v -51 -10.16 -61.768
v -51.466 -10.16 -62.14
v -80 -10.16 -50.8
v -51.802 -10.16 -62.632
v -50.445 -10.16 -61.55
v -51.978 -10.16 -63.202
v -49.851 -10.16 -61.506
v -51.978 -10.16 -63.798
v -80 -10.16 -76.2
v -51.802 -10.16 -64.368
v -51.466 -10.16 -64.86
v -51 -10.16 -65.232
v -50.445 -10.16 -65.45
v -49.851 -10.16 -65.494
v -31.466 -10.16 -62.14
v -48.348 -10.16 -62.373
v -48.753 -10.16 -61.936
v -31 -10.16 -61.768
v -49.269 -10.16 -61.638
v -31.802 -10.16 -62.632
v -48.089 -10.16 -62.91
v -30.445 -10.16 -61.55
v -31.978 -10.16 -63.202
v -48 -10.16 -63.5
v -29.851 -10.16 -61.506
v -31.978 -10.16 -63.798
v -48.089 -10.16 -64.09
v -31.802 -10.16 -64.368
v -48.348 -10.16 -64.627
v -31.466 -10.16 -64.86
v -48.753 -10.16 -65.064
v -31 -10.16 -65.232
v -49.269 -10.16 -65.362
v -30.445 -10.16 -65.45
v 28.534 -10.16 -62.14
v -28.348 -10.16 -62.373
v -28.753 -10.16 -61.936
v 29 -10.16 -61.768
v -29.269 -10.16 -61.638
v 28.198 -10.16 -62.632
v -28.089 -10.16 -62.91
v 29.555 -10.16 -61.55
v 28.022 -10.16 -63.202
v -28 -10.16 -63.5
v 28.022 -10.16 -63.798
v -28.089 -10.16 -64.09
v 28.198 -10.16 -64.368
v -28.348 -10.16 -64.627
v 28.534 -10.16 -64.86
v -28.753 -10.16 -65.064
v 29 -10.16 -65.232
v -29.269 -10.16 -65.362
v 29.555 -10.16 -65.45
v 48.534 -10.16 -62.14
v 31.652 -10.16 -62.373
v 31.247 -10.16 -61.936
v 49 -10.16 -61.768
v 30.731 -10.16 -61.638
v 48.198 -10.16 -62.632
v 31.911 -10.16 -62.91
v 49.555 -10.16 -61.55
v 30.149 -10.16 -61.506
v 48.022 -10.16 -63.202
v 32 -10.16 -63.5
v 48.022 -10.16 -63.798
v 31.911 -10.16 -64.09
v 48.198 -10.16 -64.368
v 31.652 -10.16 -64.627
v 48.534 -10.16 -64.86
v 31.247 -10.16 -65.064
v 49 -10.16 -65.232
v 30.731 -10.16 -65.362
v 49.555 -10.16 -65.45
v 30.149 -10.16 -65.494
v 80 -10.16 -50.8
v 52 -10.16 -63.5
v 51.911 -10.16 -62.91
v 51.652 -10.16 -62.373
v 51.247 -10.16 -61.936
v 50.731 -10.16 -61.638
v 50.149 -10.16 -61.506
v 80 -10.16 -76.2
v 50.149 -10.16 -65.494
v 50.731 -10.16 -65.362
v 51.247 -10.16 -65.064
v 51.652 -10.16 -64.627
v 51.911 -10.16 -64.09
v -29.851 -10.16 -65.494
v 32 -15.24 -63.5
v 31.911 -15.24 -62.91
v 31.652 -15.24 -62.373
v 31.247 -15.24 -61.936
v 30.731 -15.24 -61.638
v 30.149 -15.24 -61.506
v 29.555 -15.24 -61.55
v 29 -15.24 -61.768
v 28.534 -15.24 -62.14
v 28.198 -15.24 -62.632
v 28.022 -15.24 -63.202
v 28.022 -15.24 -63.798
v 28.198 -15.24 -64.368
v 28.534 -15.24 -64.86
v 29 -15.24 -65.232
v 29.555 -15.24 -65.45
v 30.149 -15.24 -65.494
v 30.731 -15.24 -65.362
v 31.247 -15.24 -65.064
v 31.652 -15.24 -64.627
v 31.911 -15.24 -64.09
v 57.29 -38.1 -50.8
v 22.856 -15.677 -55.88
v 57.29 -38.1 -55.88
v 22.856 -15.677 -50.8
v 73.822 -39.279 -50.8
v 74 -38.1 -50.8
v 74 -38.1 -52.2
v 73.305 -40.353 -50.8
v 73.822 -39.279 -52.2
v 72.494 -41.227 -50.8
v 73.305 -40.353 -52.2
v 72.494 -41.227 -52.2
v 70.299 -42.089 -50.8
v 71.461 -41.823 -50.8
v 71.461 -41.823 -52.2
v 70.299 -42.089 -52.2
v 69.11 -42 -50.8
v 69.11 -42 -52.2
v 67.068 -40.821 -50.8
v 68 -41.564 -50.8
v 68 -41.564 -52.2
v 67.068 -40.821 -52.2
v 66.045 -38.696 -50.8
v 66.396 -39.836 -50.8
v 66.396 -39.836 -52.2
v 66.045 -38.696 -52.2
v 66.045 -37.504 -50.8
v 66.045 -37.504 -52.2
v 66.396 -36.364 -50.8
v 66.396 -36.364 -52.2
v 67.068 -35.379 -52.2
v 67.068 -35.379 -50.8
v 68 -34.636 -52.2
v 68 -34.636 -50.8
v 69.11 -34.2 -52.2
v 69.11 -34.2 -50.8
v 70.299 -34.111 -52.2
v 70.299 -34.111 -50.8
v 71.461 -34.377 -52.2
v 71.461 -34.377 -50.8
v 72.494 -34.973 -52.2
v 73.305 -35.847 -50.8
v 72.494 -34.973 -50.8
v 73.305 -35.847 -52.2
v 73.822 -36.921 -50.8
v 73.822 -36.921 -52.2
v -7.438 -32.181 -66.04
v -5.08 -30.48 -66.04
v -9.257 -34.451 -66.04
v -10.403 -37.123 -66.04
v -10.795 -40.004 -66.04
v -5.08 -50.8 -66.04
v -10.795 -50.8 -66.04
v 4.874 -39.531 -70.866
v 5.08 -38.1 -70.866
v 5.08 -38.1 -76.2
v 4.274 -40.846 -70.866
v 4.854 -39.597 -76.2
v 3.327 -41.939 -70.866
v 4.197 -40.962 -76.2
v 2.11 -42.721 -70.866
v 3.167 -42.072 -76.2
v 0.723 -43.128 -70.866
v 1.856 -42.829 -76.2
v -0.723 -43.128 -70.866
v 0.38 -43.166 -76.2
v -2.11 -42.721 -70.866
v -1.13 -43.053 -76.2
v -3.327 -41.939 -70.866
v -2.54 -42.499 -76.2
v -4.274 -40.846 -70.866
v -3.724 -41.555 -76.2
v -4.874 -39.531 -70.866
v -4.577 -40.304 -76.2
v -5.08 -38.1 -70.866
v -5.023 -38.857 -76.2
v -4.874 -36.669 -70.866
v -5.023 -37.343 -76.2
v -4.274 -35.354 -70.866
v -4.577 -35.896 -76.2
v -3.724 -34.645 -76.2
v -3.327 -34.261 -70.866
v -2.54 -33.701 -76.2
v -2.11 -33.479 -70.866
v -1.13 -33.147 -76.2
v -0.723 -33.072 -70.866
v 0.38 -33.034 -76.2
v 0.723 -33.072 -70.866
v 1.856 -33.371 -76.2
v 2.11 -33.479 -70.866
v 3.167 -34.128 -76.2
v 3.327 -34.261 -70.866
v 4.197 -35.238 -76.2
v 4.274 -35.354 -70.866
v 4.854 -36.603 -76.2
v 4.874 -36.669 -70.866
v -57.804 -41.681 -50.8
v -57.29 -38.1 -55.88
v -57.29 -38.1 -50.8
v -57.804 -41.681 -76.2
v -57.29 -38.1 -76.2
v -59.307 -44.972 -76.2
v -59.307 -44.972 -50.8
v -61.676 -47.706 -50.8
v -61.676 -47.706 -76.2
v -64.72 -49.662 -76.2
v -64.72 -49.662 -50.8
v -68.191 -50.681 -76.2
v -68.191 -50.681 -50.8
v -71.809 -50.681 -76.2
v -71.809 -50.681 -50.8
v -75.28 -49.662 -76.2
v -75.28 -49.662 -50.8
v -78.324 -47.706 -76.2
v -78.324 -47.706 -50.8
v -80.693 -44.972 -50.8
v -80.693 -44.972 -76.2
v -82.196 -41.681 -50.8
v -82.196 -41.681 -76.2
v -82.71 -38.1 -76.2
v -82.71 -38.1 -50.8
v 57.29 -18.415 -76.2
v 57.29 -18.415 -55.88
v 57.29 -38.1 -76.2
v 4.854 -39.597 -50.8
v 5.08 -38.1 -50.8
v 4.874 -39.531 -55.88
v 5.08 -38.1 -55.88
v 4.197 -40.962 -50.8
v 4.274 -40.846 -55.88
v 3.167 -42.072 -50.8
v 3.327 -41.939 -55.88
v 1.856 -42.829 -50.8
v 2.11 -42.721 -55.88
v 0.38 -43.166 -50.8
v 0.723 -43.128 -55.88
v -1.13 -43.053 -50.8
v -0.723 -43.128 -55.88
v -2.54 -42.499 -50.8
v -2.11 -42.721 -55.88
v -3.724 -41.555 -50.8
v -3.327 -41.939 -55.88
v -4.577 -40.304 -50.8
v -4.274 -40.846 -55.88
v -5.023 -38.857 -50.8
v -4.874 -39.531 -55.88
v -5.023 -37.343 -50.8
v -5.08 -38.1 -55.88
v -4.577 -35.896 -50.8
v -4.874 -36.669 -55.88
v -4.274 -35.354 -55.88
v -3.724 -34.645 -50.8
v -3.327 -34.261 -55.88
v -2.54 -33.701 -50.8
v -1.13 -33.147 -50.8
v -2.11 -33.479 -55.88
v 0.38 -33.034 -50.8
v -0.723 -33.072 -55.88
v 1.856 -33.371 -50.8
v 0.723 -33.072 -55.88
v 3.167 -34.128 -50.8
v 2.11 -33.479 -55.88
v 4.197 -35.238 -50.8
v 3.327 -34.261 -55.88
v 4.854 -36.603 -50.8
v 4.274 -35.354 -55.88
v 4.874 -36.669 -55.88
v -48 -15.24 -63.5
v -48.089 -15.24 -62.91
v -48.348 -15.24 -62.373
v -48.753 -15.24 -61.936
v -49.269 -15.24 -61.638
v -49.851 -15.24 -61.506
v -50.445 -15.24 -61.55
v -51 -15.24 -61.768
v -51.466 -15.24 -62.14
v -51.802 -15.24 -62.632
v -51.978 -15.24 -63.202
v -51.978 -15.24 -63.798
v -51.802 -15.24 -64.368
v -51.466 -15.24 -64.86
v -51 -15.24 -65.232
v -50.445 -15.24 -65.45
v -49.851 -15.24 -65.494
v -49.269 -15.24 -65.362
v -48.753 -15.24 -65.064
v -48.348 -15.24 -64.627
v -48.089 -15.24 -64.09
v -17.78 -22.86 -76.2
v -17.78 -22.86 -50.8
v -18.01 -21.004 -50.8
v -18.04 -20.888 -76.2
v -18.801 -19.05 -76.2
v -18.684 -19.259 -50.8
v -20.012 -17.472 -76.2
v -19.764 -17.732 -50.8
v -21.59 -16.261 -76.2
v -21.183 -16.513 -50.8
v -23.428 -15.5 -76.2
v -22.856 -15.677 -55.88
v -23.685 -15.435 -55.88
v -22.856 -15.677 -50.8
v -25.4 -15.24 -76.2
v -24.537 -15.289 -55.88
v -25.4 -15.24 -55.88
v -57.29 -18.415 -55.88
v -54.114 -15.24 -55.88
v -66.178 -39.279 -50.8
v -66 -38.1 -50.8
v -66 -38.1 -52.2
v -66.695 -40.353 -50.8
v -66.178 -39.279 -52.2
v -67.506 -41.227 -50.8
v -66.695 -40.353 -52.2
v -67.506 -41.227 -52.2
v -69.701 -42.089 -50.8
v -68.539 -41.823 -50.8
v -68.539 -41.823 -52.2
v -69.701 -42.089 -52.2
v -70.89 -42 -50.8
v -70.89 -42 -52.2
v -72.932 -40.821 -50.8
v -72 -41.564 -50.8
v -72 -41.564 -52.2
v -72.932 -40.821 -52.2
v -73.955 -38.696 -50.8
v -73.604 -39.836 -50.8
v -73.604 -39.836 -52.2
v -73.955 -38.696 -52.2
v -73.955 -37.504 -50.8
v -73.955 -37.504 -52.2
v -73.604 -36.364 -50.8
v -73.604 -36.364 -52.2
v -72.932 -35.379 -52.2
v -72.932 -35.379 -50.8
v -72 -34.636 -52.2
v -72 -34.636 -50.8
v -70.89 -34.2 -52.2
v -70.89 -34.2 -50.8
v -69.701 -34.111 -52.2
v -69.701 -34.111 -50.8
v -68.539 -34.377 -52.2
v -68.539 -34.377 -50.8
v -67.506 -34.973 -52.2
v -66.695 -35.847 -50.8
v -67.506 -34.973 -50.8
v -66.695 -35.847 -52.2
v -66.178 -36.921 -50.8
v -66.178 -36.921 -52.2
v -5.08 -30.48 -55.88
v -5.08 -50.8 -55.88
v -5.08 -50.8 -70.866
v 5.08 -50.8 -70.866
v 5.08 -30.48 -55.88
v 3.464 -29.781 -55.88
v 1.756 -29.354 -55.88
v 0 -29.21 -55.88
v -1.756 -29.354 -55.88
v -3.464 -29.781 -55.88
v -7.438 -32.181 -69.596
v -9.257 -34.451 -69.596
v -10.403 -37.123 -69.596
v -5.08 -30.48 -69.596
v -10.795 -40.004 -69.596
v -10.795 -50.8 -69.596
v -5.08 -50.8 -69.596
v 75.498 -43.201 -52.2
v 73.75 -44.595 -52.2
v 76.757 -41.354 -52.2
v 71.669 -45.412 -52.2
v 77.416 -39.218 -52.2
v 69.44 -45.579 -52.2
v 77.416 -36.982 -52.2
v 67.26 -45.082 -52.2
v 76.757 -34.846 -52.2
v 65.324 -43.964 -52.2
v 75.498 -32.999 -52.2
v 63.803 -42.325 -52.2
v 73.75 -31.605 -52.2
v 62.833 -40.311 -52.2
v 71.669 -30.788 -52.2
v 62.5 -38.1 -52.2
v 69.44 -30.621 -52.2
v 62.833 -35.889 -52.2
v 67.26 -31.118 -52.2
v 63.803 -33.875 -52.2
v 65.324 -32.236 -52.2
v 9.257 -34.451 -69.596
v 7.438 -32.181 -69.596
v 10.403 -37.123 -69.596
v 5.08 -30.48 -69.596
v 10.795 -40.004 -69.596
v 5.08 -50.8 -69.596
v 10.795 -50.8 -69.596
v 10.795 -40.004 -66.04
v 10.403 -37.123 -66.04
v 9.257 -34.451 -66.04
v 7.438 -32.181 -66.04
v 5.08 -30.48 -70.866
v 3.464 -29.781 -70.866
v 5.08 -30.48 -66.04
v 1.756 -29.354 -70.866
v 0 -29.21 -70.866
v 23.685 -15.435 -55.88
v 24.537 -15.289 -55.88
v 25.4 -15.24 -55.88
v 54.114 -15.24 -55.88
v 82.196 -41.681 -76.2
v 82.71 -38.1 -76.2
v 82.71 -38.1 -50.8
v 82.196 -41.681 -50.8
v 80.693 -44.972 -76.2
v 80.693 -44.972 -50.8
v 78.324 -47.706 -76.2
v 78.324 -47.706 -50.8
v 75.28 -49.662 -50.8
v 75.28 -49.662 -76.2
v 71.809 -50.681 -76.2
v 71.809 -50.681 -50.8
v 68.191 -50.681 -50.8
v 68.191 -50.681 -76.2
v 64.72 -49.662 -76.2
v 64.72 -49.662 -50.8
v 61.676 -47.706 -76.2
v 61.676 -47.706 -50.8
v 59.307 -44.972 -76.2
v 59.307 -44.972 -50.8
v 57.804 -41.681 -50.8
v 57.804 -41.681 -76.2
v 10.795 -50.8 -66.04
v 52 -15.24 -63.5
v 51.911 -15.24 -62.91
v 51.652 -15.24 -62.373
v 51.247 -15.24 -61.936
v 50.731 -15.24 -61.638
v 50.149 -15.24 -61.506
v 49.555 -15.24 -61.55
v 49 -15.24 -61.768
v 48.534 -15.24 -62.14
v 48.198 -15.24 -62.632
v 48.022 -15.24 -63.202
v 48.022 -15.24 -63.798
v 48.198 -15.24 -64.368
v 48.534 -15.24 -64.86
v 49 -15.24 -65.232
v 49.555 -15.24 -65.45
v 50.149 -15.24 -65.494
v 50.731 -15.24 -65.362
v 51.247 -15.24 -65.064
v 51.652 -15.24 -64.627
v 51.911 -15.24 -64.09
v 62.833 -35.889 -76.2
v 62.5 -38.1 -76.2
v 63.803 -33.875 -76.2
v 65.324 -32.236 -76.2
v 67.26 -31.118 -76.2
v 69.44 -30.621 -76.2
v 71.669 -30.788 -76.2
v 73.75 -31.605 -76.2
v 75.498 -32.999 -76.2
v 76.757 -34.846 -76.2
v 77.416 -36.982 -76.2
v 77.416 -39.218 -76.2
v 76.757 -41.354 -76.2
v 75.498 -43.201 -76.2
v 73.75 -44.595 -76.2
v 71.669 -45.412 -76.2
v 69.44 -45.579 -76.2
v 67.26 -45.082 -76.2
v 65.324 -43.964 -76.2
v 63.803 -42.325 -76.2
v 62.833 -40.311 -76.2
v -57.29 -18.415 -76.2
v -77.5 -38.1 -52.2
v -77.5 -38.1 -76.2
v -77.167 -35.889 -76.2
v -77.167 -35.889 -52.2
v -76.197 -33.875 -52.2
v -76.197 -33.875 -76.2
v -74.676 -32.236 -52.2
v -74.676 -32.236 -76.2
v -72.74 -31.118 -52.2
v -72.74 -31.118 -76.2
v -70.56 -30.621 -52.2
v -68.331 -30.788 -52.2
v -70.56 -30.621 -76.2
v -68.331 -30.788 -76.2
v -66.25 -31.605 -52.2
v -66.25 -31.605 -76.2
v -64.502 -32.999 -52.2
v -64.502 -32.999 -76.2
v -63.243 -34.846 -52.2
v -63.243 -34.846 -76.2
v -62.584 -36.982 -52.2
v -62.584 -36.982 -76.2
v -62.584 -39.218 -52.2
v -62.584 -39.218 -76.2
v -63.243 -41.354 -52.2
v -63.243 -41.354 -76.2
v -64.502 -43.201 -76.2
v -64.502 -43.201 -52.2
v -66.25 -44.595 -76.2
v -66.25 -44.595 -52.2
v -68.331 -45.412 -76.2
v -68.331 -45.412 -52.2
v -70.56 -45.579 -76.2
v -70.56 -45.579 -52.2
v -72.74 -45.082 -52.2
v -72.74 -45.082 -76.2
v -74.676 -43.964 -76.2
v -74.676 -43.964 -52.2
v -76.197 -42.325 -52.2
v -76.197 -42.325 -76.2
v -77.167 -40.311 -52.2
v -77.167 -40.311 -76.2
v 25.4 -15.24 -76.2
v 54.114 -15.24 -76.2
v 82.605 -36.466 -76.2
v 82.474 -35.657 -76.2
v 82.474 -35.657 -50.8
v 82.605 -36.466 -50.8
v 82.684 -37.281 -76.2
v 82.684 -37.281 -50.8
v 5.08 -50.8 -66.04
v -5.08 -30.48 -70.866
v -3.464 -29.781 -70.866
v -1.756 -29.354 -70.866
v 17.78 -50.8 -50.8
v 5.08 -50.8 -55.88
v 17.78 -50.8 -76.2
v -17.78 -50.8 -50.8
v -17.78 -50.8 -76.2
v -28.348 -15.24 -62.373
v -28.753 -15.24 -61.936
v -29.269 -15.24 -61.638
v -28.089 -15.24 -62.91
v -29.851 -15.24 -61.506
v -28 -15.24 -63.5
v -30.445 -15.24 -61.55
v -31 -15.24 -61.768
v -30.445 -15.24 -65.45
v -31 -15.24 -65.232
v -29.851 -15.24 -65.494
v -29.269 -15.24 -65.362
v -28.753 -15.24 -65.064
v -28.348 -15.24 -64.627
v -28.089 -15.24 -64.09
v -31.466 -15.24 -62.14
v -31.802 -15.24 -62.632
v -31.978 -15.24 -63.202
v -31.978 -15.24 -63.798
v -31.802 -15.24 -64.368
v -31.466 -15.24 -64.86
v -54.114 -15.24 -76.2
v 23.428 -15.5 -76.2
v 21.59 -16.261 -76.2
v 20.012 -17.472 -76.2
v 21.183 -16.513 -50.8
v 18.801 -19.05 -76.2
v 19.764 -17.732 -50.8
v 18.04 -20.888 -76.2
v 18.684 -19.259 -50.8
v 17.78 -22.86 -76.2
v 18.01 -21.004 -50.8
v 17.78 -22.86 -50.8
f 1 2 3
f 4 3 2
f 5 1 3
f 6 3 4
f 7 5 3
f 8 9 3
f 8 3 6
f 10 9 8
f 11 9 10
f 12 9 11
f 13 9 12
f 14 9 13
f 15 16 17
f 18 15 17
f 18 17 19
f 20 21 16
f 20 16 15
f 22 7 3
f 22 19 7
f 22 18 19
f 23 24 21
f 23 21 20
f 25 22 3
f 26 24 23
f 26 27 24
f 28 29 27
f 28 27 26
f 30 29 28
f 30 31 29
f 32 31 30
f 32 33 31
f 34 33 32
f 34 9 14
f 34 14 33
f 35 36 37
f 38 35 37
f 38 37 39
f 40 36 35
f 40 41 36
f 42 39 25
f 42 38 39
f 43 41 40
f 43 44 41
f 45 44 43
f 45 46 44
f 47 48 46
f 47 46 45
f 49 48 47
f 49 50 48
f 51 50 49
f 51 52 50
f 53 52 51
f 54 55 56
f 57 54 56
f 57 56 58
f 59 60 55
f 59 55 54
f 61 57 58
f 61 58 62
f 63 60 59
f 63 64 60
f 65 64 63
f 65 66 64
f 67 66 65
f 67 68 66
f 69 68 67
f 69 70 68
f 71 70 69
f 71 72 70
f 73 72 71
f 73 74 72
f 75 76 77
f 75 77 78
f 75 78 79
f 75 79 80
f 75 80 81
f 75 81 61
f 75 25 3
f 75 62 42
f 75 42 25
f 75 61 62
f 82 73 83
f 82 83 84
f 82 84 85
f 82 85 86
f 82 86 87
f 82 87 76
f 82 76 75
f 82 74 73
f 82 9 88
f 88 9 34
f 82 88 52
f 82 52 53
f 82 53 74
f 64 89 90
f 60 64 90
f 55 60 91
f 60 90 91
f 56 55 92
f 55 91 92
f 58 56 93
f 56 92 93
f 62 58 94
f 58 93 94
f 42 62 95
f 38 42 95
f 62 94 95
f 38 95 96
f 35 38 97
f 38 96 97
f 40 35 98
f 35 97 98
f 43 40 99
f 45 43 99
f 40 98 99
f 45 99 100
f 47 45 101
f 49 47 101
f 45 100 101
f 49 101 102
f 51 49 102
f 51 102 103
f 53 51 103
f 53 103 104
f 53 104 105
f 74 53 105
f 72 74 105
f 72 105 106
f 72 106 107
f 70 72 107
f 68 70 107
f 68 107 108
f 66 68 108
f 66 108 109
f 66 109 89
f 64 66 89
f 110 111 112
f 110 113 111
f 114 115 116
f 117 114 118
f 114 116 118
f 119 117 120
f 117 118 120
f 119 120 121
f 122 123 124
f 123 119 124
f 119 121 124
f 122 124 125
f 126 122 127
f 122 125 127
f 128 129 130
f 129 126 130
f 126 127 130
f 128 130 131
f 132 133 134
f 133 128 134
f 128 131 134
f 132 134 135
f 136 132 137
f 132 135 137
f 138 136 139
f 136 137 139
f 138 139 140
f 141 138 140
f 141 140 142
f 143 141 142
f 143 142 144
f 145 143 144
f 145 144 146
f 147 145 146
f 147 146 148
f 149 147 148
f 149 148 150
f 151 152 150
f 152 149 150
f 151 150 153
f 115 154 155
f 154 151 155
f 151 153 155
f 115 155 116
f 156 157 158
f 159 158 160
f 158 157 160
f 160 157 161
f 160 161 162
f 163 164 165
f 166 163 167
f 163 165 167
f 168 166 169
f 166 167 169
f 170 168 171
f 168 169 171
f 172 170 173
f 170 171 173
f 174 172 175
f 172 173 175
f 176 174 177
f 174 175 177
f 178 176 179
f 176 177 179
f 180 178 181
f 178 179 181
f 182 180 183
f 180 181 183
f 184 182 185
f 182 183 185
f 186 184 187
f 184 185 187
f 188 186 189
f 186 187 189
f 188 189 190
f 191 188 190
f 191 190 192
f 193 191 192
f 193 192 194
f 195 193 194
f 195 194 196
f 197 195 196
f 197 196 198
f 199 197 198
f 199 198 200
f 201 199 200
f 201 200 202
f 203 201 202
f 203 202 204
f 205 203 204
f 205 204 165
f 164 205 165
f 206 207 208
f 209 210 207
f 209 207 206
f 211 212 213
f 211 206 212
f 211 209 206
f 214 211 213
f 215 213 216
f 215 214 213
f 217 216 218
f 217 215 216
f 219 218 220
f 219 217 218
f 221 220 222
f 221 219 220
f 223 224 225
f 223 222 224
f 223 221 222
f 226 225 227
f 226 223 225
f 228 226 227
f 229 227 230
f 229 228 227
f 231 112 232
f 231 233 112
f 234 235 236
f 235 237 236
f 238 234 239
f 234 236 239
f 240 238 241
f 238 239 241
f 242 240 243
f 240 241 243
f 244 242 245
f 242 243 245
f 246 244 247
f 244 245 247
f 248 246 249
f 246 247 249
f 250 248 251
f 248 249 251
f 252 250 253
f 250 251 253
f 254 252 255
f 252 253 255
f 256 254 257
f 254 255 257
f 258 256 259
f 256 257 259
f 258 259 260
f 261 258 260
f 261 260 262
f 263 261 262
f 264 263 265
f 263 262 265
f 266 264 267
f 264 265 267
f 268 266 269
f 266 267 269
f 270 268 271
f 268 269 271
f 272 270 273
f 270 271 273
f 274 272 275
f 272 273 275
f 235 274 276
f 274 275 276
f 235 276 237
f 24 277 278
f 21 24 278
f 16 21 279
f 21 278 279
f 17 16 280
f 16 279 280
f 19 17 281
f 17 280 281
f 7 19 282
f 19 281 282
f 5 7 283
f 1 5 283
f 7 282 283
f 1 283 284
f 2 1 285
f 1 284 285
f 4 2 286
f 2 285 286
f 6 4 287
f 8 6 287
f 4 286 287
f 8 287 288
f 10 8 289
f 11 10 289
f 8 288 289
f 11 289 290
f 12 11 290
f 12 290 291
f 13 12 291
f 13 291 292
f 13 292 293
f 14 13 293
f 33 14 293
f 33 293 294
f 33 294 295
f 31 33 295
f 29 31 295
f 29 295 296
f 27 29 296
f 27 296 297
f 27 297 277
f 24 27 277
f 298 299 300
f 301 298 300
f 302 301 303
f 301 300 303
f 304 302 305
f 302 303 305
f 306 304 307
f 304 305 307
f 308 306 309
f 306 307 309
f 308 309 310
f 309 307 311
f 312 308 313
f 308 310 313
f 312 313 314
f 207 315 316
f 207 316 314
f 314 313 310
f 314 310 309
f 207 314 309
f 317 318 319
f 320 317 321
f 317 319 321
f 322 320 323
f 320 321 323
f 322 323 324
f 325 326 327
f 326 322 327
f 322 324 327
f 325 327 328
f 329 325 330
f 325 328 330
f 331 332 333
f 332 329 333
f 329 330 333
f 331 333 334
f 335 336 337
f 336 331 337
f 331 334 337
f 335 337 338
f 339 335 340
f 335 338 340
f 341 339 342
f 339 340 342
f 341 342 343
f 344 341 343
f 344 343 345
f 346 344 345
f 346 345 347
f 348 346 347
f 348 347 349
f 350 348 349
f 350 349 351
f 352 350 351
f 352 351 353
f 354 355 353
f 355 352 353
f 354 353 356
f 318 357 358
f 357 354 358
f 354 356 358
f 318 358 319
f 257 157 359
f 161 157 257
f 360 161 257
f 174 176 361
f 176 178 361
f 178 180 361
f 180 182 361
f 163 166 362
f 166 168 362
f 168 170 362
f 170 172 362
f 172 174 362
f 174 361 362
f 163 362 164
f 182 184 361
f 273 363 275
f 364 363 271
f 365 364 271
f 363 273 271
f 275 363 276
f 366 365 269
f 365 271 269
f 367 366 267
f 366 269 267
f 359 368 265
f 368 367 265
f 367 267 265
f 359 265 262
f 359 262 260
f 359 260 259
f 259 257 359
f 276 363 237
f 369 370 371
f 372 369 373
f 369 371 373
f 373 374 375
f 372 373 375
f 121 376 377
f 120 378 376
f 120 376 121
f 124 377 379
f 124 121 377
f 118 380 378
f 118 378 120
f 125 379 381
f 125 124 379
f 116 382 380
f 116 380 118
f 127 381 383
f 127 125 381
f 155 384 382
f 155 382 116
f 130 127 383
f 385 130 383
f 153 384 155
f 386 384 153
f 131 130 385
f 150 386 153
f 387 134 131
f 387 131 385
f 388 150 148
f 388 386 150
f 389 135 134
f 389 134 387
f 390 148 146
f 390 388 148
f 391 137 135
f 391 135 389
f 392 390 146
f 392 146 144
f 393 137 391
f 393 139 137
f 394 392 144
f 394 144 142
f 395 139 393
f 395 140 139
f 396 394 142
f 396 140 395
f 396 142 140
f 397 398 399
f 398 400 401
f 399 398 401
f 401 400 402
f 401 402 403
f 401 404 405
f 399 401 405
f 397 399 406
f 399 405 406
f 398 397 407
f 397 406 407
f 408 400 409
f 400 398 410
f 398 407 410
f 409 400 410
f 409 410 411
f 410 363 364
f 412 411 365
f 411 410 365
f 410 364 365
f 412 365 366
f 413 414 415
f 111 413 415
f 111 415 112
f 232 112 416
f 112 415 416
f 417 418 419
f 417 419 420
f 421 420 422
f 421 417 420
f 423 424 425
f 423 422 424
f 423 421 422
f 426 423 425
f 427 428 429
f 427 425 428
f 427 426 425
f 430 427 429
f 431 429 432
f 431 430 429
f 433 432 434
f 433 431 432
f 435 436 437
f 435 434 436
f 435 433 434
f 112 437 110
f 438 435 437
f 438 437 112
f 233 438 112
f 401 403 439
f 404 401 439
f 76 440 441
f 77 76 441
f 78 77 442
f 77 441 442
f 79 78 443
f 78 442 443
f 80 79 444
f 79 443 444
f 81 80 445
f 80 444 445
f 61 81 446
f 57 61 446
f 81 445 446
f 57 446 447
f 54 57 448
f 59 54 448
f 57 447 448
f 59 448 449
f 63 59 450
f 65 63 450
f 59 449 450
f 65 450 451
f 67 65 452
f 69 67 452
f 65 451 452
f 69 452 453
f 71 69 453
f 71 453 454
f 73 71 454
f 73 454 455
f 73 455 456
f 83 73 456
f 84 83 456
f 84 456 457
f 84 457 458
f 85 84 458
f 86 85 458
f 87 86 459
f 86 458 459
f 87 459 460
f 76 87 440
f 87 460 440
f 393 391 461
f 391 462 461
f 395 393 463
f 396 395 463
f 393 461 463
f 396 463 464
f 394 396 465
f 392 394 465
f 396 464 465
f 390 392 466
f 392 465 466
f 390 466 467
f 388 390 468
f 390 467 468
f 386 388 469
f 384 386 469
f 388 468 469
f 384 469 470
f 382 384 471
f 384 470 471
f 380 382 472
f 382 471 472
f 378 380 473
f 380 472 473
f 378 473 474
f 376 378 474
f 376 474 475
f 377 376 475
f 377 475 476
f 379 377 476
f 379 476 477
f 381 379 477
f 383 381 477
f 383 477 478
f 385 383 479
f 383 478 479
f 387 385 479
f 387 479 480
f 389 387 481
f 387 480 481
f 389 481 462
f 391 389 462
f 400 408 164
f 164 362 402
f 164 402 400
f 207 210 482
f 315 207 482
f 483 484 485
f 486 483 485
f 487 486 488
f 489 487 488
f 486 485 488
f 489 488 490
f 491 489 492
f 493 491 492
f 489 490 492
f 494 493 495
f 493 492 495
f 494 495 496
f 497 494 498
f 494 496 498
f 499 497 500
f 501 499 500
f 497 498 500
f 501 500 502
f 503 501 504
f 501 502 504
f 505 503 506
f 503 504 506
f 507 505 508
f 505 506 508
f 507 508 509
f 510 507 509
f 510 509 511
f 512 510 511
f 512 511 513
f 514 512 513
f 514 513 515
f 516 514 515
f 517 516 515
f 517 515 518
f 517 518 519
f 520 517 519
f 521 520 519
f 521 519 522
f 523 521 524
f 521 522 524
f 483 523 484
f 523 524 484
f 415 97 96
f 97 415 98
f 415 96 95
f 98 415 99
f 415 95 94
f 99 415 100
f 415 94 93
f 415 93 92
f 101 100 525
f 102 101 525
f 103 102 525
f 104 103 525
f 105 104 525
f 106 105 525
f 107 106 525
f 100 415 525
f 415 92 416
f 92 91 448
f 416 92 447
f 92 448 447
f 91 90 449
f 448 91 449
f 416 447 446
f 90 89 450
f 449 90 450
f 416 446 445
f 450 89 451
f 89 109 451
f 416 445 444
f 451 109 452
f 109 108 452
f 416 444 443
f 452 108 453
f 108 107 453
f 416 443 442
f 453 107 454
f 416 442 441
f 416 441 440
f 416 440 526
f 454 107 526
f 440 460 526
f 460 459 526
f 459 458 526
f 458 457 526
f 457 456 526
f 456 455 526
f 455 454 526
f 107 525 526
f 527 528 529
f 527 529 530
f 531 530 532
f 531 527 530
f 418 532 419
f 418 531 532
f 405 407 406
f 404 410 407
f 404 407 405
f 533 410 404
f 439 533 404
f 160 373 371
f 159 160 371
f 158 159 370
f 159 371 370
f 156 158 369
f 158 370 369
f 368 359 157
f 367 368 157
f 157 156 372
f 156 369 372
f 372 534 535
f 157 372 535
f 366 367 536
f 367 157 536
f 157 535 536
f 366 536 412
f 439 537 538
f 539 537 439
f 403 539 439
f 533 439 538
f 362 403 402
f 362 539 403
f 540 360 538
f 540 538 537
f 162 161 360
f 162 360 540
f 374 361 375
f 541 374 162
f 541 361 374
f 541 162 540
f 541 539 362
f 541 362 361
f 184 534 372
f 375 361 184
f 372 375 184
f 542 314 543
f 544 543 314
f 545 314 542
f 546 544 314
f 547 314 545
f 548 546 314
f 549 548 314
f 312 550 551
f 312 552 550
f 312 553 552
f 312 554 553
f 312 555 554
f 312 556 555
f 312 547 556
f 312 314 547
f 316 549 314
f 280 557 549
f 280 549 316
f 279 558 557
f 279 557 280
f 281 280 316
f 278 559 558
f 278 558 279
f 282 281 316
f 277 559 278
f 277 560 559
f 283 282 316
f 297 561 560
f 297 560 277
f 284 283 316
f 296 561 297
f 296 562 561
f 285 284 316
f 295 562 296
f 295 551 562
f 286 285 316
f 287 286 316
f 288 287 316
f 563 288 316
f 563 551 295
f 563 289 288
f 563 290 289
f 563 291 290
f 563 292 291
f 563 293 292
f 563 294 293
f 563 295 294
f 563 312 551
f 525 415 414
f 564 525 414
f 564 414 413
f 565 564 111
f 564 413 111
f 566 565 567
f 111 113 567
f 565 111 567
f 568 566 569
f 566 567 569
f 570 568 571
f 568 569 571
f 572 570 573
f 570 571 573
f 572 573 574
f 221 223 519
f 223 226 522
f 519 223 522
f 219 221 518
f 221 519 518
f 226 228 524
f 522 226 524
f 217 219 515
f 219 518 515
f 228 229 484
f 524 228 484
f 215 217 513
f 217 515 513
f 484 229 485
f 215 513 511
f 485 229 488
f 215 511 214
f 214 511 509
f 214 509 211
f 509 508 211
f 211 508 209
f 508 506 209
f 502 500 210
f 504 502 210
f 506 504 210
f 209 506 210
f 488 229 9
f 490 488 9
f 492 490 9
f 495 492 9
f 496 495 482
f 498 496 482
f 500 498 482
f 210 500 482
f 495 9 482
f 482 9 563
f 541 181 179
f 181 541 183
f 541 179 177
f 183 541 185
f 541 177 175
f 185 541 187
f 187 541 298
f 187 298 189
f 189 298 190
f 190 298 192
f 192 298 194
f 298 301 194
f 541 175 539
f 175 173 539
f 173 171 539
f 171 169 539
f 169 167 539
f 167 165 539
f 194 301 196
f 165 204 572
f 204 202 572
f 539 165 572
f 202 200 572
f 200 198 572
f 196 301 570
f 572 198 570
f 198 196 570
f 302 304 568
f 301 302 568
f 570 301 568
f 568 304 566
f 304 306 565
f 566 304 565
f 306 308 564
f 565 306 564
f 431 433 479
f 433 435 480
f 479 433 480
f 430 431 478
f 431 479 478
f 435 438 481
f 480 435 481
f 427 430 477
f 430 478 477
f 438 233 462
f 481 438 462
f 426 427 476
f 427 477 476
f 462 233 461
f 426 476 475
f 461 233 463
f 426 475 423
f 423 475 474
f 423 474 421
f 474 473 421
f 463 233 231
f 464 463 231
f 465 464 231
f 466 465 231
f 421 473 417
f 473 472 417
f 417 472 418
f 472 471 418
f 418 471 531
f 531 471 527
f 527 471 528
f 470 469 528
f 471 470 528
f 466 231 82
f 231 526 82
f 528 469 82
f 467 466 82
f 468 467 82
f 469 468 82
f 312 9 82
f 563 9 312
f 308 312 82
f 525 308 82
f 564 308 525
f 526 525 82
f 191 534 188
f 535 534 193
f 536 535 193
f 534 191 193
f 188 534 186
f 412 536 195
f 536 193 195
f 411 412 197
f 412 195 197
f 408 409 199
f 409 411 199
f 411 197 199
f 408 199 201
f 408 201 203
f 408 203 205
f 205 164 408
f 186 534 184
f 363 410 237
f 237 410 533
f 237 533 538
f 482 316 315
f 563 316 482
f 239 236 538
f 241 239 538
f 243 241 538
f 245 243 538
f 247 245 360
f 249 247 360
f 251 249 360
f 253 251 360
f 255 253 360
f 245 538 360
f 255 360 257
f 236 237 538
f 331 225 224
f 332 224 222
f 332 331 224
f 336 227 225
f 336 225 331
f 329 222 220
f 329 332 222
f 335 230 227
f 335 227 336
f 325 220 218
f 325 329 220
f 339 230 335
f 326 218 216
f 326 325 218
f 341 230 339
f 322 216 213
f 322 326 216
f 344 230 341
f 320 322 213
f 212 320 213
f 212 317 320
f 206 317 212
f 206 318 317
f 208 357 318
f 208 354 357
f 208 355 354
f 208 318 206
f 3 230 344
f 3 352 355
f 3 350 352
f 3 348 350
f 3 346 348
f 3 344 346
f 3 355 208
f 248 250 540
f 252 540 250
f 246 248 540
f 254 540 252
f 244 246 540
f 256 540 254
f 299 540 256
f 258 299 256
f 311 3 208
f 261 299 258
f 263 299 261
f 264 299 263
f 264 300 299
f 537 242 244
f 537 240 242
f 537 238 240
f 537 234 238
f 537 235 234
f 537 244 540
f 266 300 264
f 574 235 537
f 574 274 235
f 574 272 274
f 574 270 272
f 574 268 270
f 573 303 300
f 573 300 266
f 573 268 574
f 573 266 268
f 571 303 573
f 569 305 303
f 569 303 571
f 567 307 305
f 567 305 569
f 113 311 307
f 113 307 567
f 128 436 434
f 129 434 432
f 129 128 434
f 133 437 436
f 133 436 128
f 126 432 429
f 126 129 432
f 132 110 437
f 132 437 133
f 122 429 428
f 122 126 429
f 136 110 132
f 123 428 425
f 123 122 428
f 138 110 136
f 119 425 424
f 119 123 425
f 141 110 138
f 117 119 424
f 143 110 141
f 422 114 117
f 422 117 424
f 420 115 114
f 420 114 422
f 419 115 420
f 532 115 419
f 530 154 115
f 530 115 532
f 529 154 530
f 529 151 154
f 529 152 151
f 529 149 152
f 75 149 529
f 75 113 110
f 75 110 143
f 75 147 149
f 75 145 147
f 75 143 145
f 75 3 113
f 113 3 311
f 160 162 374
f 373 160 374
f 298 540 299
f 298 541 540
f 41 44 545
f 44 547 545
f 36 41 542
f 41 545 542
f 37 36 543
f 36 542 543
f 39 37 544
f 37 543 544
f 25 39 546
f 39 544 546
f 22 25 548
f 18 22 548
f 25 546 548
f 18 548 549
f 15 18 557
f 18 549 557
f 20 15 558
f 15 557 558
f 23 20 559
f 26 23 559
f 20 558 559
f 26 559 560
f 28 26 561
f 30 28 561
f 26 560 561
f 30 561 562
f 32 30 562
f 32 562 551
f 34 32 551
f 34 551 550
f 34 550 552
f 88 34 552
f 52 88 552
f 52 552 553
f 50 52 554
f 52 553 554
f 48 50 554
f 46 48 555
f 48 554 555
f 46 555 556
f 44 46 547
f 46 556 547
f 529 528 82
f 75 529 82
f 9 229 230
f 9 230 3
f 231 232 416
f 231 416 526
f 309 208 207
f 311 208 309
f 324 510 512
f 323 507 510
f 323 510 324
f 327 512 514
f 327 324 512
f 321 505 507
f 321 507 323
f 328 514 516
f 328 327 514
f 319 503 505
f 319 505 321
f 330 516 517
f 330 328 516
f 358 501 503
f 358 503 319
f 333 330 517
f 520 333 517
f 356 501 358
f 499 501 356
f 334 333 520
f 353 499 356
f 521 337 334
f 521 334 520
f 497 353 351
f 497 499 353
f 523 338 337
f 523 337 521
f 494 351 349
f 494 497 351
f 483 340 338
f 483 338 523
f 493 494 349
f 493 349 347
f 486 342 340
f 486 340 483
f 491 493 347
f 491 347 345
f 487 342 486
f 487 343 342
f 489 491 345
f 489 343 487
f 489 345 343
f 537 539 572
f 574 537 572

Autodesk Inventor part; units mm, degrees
ref_plane "YZ Plane" through (0, 0, 0) normal (1, 0, 0) x (0, 1, 0)
ref_plane "XZ Plane" through (0, 0, 0) normal (0, 1, 0) x (-1, 0, 0)
ref_plane "XY Plane" through (0, 0, 0) normal (0, 0, 1) x (1, 0, 0)
ref_plane "Work Plane1" through (0, 0, -76.2) normal (0, 0, 1) x (1, 0, 0)
sketch "Sketch1" plane through (0, 0, -76.2) normal (0, 0, 1) x (1, 0, 0)
  line L0 (-80, -10.16) -> (80, -10.16) projected
  circle A0 centre (70, -38.1) radius 4 projected
  circle A1 centre (-70, -38.1) radius 4 projected
  arc A2 (82.7105, -38.1) -> (57.2895, -38.1) centre (70, -38.1) ccw projected
  arc A3 (57.2895, -38.1) -> (82.4735, -35.6569) centre (70, -38.1) ccw
  arc A4 (-82.4735, -35.6569) -> (-57.2895, -38.1) centre (-70, -38.1) ccw
  line L1 (82.7105, -38.1) -> (80, -10.16)
  line L2 (-82.7105, -38.1) -> (-80, -10.16)
  circle A5 centre (0, -38.1) radius 5.08
  line L3 (17.78, -25.4) -> (17.78, -50.8)
  line L4 (17.78, -50.8) -> (-17.78, -50.8)
  line L5 (-17.78, -50.8) -> (-17.78, -25.4)
  line L6 (-17.78, -25.4) -> (17.78, -50.8) construction
  line L7 (17.78, -25.4) -> (-17.78, -50.8) construction
  line L8 (80, -10.16) -> (-80, -10.16)
  line L9 (-17.78, -15.24) -> (-57.2895, -15.24)
  line L10 (17.78, -15.24) -> (57.2895, -15.24)
  line L11 (57.2895, -38.1) -> (57.2895, -15.24)
  line L12 (-57.2895, -38.1) -> (-57.2895, -15.24)
  line L13 (-17.78, -38.1) -> (-17.78, -15.24)
  line L14 (17.78, -38.1) -> (17.78, -15.24)
  point P0 (0, 0)
  dimension "d0" = 10.16
  dimension "d2" = 35.56
  dimension "d3" = 25.4
extrude "Extrusion1" add sketch "Sketch1" along normal blind 25.4 contours L0 L1 A2 L11 L10 L14 L3 L4 L5 L13 L9 L12 A4 L2 | L1 A3 A2 | A2 L1
sketch "Sketch2" plane through (0, 0, -76.2) normal (0, 0, -1) x (-1, 0, 0)
  circle A0 centre (-70, -38.1) radius 4 projected
  circle A1 centre (-70, -38.1) radius 7.5
  circle A2 centre (70, -38.1) radius 4 projected
  circle A3 centre (70, -38.1) radius 7.5
  point P0 (0, 0)
  dimension "d7" = 15
  dimension "d8" = 15
extrude "Extrusion2" cut sketch "Sketch2" against normal blind 24
sketch "Sketch3" plane through (-17.78, -50.8, -76.2) normal (0, -1, 0) x (1, 0, 0)
  line L0 (0, 0) -> (35.56, 0) projected
  line L1 (0, 0) -> (0, 25.4) projected
  line L2 (0, 25.4) -> (35.56, 25.4) projected
  line L3 (35.56, 0) -> (35.56, 25.4) projected
  line L4 (12.7, 0) -> (12.7, 25.4) projected
  line L5 (22.86, 0) -> (22.86, 25.4) projected
  line L6 (12.7, 25.4) -> (22.86, 25.4) projected
  line L7 (17.78, 25.4) -> (17.78, 20.32)
  line L8 (22.86, 20.32) -> (12.7, 20.32)
  line L9 (12.7, 20.32) -> (12.7, 10.16)
  line L10 (12.7, 10.16) -> (22.86, 10.16)
  line L11 (22.86, 10.16) -> (22.86, 20.32)
  line L12 (17.78, 10.16) -> (28.575, 10.16)
  line L13 (28.575, 10.16) -> (6.985, 10.16)
  line L14 (28.575, 10.16) -> (6.985, 10.16)
  line L15 (6.985, 10.16) -> (6.985, 6.604)
  line L16 (6.985, 6.604) -> (28.575, 6.604)
  line L17 (28.575, 6.604) -> (28.575, 10.16)
  line L18 (12.7, 5.334) -> (22.86, 5.334)
  line L19 (22.86, 5.334) -> (22.86, 7.874)
  line L20 (22.86, 7.874) -> (12.7, 7.874)
  line L21 (12.7, 7.874) -> (12.7, 5.334)
  line L22 (12.7, 5.334) -> (22.86, 7.874) construction
  line L23 (22.86, 5.334) -> (12.7, 7.874) construction
  point P0 (17.78, 76.2)
  point P1 (17.78, 6.604)
  dimension "d11" = 5.08
  dimension "d12" = 10.16
  dimension "d13" = 10.16
  dimension "d14" = 10.795
  dimension "d15" = 21.59
  dimension "d16" = 21.59
  dimension "d17" = 3.556
  dimension "d18" = 10.16
  dimension "d19" = 2.54
extrude "Extrusion3" cut sketch "Sketch3" against normal blind 21.59 contours L4 L16 L5 L18 | L16 L15 L13 L4 | L4 L20 L5 L16 | L8 L5 L10 L4 | L5 L12 L17 L16 | L4 L10 L5 L20
fillet "Fillet1" radius 10.795 2 edges at (-10.795, -29.21, -67.818) (10.795, -29.21, -67.818)
sketch "Sketch4" plane through (17.78, -15.24, -76.2) normal (0, -1, 0) x (1, 0, 0)
  line L0 (0, 0) -> (39.5095, 0) projected
  line L1 (0, 25.4) -> (39.5095, 25.4) projected
  line L2 (-75.0695, 0) -> (-35.56, 0) projected
  line L3 (62.22, 25.4) -> (-97.78, 25.4) projected
  line L4 (-97.78, -170.15) -> (-97.78, 69.85) projected
  line L5 (62.22, -170.15) -> (-97.78, -170.15) projected
  line L6 (62.22, 69.85) -> (62.22, -170.15) projected
  line L7 (-97.78, 69.85) -> (62.22, 69.85) projected
  line L8 (62.22, 0) -> (62.22, 25.4) projected
  line L9 (62.22, 12.7) -> (32.22, 12.7)
  line L10 (32.22, 12.7) -> (12.22, 12.7)
  circle A0 centre (32.22, 12.7) radius 2
  circle A1 centre (12.22, 12.7) radius 2
  line L11 (62.22, 0) -> (-97.78, 0) projected
  line L12 (-17.78, 0) -> (-17.78, 2.4889)
  circle A2 centre (-67.78, 12.7) radius 2
  circle A3 centre (-47.78, 12.7) radius 2
  point P0 (-17.78, 76.2)
  dimension "d23" = 30
  dimension "d24" = 20
  dimension "d25" = 4
  dimension "d26" = 4
extrude "Extrusion4" cut sketch "Sketch4" against normal blind 25.4 contours A1 | A0 L10 L9 | L9 L10 A0 | A2 | A3
chamfer "Chamfer1" distance 3.175 angle 45 2 edges at (57.2895, -15.24, -63.5) (-57.2895, -15.24, -63.5)
fillet "Fillet2" radius 7.62 2 edges at (17.78, -15.24, -63.5) (-17.78, -15.24, -63.5)
sketch "Sketch5" plane through (0, 0, -76.2) normal (0, 0, -1) x (-1, 0, 0)
  point P0 (0, 0)
sketch "Sketch6" plane through (0, 0, -50.8) normal (0, 0, 1) x (1, 0, 0)
  line L0 (-57.2895, -18.415) -> (-54.1145, -15.24) projected
  line L1 (-57.2895, -38.1) -> (-57.2895, -18.415) projected
  line L2 (-57.2895, -38.1) -> (-22.1843, -15.24) projected
  line L3 (-54.1145, -15.24) -> (-22.1843, -15.24) projected
  line L4 (57.2895, -18.415) -> (57.2895, -38.1) projected
  line L5 (54.1145, -15.24) -> (57.2895, -18.415) projected
  line L6 (22.1843, -15.24) -> (54.1145, -15.24) projected
  line L7 (22.1843, -15.24) -> (57.2895, -38.1) projected
  point P0 (0, 0)
extrude "Extrusion5" add sketch "Sketch6" against normal blind 5.08
properties part number "Bed Slide"
